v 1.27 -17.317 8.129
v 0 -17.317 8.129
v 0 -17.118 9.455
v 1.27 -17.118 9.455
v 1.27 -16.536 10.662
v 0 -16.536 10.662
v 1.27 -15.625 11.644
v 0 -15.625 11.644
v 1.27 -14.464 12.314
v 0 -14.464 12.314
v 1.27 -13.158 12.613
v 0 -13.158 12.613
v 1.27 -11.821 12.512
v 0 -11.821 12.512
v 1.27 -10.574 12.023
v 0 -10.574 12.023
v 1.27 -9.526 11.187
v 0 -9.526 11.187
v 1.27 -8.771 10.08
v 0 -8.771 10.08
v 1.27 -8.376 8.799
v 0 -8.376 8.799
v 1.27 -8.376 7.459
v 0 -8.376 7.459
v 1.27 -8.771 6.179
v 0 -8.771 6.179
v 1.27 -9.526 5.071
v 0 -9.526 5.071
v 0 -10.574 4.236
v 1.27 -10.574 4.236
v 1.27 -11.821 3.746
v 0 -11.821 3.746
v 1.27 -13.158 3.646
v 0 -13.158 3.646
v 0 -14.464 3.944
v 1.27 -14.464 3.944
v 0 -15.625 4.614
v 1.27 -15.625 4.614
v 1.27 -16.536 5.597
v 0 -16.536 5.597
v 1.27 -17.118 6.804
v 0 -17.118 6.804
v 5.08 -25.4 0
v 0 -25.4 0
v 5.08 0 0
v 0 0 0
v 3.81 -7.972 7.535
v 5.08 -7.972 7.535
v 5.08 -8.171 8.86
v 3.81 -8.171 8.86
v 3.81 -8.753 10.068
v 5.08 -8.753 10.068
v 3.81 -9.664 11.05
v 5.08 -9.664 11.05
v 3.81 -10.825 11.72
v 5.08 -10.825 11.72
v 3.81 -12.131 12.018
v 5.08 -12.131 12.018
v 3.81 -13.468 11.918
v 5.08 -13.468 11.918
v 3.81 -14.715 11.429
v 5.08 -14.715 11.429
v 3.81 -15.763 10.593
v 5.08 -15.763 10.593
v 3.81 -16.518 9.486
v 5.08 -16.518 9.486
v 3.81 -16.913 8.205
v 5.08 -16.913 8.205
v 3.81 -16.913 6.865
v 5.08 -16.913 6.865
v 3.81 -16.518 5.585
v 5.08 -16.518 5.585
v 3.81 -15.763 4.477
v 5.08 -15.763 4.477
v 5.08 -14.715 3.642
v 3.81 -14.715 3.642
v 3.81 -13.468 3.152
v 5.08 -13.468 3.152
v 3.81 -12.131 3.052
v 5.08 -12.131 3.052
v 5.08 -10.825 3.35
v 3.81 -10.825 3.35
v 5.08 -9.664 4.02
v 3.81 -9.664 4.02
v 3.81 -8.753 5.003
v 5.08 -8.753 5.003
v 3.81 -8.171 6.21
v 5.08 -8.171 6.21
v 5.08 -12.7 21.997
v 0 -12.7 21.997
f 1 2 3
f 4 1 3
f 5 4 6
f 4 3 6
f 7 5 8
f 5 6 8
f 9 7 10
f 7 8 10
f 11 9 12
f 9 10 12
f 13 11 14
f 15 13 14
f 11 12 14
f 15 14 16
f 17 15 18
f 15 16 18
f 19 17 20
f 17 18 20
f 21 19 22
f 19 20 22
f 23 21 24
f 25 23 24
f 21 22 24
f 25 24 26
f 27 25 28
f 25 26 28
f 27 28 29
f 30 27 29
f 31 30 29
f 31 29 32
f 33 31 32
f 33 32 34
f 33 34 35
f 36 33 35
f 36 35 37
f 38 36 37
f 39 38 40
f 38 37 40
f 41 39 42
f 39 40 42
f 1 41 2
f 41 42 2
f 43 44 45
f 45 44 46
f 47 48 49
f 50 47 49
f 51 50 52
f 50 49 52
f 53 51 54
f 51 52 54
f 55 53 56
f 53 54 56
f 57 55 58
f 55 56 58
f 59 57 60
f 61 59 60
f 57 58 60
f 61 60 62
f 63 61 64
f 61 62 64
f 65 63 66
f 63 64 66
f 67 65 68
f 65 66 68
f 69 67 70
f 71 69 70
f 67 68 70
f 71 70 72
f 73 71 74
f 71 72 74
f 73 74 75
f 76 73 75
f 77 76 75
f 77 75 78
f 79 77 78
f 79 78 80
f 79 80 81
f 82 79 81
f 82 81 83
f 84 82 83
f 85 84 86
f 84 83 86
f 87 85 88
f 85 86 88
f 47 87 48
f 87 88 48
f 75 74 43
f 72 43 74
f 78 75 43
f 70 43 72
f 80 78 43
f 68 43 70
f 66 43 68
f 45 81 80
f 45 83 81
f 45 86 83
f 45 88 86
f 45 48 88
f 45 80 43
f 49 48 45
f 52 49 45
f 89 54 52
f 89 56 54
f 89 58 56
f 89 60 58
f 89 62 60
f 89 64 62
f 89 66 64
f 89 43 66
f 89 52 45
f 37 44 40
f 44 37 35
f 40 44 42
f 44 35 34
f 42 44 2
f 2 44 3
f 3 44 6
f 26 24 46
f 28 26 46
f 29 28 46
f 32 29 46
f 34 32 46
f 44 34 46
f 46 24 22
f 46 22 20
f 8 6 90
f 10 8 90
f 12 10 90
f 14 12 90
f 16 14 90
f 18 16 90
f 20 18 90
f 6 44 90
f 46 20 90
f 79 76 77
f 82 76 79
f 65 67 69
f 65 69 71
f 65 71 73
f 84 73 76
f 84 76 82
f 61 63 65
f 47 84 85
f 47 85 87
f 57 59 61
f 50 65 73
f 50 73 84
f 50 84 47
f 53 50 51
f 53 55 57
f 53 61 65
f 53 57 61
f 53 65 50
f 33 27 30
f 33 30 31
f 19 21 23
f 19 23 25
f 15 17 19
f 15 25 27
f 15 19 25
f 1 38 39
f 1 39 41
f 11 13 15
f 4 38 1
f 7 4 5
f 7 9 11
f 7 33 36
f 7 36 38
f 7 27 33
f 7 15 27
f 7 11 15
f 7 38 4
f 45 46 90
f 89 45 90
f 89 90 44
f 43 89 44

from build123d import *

# Parameters (mm, degrees)
F1_DEPTH = 5.08
F2_R     = 4.4958
F3_DEPTH = 1.27
F4_R     = 4.4958
F5_DEPTH = 1.27


with BuildPart() as f1:
    # F0 (on Right) → F1 (new body)
    with BuildSketch(Plane.YZ):
        Polygon((0, 0), (-12.7, 21.997045), (-25.4, 0), align=None)
    extrude(amount=F1_DEPTH)

    # F2 (on face) → F3 (cut)
    with BuildSketch(Plane.YZ.offset(5.08)):
        with Locations((-12.467312, 7.535188)):
            Circle(F2_R)
    extrude(amount=-F3_DEPTH, mode=Mode.SUBTRACT)

    # F4 (on face) → F5 (cut)
    with BuildSketch(Plane(origin=(0, 0, 0), x_dir=(0, -1, 0), z_dir=(-1, 0, 0))):
        with Locations((12.821567, 8.129397)):
            Circle(F4_R)
    extrude(amount=-F5_DEPTH, mode=Mode.SUBTRACT)


solid = f1.part
